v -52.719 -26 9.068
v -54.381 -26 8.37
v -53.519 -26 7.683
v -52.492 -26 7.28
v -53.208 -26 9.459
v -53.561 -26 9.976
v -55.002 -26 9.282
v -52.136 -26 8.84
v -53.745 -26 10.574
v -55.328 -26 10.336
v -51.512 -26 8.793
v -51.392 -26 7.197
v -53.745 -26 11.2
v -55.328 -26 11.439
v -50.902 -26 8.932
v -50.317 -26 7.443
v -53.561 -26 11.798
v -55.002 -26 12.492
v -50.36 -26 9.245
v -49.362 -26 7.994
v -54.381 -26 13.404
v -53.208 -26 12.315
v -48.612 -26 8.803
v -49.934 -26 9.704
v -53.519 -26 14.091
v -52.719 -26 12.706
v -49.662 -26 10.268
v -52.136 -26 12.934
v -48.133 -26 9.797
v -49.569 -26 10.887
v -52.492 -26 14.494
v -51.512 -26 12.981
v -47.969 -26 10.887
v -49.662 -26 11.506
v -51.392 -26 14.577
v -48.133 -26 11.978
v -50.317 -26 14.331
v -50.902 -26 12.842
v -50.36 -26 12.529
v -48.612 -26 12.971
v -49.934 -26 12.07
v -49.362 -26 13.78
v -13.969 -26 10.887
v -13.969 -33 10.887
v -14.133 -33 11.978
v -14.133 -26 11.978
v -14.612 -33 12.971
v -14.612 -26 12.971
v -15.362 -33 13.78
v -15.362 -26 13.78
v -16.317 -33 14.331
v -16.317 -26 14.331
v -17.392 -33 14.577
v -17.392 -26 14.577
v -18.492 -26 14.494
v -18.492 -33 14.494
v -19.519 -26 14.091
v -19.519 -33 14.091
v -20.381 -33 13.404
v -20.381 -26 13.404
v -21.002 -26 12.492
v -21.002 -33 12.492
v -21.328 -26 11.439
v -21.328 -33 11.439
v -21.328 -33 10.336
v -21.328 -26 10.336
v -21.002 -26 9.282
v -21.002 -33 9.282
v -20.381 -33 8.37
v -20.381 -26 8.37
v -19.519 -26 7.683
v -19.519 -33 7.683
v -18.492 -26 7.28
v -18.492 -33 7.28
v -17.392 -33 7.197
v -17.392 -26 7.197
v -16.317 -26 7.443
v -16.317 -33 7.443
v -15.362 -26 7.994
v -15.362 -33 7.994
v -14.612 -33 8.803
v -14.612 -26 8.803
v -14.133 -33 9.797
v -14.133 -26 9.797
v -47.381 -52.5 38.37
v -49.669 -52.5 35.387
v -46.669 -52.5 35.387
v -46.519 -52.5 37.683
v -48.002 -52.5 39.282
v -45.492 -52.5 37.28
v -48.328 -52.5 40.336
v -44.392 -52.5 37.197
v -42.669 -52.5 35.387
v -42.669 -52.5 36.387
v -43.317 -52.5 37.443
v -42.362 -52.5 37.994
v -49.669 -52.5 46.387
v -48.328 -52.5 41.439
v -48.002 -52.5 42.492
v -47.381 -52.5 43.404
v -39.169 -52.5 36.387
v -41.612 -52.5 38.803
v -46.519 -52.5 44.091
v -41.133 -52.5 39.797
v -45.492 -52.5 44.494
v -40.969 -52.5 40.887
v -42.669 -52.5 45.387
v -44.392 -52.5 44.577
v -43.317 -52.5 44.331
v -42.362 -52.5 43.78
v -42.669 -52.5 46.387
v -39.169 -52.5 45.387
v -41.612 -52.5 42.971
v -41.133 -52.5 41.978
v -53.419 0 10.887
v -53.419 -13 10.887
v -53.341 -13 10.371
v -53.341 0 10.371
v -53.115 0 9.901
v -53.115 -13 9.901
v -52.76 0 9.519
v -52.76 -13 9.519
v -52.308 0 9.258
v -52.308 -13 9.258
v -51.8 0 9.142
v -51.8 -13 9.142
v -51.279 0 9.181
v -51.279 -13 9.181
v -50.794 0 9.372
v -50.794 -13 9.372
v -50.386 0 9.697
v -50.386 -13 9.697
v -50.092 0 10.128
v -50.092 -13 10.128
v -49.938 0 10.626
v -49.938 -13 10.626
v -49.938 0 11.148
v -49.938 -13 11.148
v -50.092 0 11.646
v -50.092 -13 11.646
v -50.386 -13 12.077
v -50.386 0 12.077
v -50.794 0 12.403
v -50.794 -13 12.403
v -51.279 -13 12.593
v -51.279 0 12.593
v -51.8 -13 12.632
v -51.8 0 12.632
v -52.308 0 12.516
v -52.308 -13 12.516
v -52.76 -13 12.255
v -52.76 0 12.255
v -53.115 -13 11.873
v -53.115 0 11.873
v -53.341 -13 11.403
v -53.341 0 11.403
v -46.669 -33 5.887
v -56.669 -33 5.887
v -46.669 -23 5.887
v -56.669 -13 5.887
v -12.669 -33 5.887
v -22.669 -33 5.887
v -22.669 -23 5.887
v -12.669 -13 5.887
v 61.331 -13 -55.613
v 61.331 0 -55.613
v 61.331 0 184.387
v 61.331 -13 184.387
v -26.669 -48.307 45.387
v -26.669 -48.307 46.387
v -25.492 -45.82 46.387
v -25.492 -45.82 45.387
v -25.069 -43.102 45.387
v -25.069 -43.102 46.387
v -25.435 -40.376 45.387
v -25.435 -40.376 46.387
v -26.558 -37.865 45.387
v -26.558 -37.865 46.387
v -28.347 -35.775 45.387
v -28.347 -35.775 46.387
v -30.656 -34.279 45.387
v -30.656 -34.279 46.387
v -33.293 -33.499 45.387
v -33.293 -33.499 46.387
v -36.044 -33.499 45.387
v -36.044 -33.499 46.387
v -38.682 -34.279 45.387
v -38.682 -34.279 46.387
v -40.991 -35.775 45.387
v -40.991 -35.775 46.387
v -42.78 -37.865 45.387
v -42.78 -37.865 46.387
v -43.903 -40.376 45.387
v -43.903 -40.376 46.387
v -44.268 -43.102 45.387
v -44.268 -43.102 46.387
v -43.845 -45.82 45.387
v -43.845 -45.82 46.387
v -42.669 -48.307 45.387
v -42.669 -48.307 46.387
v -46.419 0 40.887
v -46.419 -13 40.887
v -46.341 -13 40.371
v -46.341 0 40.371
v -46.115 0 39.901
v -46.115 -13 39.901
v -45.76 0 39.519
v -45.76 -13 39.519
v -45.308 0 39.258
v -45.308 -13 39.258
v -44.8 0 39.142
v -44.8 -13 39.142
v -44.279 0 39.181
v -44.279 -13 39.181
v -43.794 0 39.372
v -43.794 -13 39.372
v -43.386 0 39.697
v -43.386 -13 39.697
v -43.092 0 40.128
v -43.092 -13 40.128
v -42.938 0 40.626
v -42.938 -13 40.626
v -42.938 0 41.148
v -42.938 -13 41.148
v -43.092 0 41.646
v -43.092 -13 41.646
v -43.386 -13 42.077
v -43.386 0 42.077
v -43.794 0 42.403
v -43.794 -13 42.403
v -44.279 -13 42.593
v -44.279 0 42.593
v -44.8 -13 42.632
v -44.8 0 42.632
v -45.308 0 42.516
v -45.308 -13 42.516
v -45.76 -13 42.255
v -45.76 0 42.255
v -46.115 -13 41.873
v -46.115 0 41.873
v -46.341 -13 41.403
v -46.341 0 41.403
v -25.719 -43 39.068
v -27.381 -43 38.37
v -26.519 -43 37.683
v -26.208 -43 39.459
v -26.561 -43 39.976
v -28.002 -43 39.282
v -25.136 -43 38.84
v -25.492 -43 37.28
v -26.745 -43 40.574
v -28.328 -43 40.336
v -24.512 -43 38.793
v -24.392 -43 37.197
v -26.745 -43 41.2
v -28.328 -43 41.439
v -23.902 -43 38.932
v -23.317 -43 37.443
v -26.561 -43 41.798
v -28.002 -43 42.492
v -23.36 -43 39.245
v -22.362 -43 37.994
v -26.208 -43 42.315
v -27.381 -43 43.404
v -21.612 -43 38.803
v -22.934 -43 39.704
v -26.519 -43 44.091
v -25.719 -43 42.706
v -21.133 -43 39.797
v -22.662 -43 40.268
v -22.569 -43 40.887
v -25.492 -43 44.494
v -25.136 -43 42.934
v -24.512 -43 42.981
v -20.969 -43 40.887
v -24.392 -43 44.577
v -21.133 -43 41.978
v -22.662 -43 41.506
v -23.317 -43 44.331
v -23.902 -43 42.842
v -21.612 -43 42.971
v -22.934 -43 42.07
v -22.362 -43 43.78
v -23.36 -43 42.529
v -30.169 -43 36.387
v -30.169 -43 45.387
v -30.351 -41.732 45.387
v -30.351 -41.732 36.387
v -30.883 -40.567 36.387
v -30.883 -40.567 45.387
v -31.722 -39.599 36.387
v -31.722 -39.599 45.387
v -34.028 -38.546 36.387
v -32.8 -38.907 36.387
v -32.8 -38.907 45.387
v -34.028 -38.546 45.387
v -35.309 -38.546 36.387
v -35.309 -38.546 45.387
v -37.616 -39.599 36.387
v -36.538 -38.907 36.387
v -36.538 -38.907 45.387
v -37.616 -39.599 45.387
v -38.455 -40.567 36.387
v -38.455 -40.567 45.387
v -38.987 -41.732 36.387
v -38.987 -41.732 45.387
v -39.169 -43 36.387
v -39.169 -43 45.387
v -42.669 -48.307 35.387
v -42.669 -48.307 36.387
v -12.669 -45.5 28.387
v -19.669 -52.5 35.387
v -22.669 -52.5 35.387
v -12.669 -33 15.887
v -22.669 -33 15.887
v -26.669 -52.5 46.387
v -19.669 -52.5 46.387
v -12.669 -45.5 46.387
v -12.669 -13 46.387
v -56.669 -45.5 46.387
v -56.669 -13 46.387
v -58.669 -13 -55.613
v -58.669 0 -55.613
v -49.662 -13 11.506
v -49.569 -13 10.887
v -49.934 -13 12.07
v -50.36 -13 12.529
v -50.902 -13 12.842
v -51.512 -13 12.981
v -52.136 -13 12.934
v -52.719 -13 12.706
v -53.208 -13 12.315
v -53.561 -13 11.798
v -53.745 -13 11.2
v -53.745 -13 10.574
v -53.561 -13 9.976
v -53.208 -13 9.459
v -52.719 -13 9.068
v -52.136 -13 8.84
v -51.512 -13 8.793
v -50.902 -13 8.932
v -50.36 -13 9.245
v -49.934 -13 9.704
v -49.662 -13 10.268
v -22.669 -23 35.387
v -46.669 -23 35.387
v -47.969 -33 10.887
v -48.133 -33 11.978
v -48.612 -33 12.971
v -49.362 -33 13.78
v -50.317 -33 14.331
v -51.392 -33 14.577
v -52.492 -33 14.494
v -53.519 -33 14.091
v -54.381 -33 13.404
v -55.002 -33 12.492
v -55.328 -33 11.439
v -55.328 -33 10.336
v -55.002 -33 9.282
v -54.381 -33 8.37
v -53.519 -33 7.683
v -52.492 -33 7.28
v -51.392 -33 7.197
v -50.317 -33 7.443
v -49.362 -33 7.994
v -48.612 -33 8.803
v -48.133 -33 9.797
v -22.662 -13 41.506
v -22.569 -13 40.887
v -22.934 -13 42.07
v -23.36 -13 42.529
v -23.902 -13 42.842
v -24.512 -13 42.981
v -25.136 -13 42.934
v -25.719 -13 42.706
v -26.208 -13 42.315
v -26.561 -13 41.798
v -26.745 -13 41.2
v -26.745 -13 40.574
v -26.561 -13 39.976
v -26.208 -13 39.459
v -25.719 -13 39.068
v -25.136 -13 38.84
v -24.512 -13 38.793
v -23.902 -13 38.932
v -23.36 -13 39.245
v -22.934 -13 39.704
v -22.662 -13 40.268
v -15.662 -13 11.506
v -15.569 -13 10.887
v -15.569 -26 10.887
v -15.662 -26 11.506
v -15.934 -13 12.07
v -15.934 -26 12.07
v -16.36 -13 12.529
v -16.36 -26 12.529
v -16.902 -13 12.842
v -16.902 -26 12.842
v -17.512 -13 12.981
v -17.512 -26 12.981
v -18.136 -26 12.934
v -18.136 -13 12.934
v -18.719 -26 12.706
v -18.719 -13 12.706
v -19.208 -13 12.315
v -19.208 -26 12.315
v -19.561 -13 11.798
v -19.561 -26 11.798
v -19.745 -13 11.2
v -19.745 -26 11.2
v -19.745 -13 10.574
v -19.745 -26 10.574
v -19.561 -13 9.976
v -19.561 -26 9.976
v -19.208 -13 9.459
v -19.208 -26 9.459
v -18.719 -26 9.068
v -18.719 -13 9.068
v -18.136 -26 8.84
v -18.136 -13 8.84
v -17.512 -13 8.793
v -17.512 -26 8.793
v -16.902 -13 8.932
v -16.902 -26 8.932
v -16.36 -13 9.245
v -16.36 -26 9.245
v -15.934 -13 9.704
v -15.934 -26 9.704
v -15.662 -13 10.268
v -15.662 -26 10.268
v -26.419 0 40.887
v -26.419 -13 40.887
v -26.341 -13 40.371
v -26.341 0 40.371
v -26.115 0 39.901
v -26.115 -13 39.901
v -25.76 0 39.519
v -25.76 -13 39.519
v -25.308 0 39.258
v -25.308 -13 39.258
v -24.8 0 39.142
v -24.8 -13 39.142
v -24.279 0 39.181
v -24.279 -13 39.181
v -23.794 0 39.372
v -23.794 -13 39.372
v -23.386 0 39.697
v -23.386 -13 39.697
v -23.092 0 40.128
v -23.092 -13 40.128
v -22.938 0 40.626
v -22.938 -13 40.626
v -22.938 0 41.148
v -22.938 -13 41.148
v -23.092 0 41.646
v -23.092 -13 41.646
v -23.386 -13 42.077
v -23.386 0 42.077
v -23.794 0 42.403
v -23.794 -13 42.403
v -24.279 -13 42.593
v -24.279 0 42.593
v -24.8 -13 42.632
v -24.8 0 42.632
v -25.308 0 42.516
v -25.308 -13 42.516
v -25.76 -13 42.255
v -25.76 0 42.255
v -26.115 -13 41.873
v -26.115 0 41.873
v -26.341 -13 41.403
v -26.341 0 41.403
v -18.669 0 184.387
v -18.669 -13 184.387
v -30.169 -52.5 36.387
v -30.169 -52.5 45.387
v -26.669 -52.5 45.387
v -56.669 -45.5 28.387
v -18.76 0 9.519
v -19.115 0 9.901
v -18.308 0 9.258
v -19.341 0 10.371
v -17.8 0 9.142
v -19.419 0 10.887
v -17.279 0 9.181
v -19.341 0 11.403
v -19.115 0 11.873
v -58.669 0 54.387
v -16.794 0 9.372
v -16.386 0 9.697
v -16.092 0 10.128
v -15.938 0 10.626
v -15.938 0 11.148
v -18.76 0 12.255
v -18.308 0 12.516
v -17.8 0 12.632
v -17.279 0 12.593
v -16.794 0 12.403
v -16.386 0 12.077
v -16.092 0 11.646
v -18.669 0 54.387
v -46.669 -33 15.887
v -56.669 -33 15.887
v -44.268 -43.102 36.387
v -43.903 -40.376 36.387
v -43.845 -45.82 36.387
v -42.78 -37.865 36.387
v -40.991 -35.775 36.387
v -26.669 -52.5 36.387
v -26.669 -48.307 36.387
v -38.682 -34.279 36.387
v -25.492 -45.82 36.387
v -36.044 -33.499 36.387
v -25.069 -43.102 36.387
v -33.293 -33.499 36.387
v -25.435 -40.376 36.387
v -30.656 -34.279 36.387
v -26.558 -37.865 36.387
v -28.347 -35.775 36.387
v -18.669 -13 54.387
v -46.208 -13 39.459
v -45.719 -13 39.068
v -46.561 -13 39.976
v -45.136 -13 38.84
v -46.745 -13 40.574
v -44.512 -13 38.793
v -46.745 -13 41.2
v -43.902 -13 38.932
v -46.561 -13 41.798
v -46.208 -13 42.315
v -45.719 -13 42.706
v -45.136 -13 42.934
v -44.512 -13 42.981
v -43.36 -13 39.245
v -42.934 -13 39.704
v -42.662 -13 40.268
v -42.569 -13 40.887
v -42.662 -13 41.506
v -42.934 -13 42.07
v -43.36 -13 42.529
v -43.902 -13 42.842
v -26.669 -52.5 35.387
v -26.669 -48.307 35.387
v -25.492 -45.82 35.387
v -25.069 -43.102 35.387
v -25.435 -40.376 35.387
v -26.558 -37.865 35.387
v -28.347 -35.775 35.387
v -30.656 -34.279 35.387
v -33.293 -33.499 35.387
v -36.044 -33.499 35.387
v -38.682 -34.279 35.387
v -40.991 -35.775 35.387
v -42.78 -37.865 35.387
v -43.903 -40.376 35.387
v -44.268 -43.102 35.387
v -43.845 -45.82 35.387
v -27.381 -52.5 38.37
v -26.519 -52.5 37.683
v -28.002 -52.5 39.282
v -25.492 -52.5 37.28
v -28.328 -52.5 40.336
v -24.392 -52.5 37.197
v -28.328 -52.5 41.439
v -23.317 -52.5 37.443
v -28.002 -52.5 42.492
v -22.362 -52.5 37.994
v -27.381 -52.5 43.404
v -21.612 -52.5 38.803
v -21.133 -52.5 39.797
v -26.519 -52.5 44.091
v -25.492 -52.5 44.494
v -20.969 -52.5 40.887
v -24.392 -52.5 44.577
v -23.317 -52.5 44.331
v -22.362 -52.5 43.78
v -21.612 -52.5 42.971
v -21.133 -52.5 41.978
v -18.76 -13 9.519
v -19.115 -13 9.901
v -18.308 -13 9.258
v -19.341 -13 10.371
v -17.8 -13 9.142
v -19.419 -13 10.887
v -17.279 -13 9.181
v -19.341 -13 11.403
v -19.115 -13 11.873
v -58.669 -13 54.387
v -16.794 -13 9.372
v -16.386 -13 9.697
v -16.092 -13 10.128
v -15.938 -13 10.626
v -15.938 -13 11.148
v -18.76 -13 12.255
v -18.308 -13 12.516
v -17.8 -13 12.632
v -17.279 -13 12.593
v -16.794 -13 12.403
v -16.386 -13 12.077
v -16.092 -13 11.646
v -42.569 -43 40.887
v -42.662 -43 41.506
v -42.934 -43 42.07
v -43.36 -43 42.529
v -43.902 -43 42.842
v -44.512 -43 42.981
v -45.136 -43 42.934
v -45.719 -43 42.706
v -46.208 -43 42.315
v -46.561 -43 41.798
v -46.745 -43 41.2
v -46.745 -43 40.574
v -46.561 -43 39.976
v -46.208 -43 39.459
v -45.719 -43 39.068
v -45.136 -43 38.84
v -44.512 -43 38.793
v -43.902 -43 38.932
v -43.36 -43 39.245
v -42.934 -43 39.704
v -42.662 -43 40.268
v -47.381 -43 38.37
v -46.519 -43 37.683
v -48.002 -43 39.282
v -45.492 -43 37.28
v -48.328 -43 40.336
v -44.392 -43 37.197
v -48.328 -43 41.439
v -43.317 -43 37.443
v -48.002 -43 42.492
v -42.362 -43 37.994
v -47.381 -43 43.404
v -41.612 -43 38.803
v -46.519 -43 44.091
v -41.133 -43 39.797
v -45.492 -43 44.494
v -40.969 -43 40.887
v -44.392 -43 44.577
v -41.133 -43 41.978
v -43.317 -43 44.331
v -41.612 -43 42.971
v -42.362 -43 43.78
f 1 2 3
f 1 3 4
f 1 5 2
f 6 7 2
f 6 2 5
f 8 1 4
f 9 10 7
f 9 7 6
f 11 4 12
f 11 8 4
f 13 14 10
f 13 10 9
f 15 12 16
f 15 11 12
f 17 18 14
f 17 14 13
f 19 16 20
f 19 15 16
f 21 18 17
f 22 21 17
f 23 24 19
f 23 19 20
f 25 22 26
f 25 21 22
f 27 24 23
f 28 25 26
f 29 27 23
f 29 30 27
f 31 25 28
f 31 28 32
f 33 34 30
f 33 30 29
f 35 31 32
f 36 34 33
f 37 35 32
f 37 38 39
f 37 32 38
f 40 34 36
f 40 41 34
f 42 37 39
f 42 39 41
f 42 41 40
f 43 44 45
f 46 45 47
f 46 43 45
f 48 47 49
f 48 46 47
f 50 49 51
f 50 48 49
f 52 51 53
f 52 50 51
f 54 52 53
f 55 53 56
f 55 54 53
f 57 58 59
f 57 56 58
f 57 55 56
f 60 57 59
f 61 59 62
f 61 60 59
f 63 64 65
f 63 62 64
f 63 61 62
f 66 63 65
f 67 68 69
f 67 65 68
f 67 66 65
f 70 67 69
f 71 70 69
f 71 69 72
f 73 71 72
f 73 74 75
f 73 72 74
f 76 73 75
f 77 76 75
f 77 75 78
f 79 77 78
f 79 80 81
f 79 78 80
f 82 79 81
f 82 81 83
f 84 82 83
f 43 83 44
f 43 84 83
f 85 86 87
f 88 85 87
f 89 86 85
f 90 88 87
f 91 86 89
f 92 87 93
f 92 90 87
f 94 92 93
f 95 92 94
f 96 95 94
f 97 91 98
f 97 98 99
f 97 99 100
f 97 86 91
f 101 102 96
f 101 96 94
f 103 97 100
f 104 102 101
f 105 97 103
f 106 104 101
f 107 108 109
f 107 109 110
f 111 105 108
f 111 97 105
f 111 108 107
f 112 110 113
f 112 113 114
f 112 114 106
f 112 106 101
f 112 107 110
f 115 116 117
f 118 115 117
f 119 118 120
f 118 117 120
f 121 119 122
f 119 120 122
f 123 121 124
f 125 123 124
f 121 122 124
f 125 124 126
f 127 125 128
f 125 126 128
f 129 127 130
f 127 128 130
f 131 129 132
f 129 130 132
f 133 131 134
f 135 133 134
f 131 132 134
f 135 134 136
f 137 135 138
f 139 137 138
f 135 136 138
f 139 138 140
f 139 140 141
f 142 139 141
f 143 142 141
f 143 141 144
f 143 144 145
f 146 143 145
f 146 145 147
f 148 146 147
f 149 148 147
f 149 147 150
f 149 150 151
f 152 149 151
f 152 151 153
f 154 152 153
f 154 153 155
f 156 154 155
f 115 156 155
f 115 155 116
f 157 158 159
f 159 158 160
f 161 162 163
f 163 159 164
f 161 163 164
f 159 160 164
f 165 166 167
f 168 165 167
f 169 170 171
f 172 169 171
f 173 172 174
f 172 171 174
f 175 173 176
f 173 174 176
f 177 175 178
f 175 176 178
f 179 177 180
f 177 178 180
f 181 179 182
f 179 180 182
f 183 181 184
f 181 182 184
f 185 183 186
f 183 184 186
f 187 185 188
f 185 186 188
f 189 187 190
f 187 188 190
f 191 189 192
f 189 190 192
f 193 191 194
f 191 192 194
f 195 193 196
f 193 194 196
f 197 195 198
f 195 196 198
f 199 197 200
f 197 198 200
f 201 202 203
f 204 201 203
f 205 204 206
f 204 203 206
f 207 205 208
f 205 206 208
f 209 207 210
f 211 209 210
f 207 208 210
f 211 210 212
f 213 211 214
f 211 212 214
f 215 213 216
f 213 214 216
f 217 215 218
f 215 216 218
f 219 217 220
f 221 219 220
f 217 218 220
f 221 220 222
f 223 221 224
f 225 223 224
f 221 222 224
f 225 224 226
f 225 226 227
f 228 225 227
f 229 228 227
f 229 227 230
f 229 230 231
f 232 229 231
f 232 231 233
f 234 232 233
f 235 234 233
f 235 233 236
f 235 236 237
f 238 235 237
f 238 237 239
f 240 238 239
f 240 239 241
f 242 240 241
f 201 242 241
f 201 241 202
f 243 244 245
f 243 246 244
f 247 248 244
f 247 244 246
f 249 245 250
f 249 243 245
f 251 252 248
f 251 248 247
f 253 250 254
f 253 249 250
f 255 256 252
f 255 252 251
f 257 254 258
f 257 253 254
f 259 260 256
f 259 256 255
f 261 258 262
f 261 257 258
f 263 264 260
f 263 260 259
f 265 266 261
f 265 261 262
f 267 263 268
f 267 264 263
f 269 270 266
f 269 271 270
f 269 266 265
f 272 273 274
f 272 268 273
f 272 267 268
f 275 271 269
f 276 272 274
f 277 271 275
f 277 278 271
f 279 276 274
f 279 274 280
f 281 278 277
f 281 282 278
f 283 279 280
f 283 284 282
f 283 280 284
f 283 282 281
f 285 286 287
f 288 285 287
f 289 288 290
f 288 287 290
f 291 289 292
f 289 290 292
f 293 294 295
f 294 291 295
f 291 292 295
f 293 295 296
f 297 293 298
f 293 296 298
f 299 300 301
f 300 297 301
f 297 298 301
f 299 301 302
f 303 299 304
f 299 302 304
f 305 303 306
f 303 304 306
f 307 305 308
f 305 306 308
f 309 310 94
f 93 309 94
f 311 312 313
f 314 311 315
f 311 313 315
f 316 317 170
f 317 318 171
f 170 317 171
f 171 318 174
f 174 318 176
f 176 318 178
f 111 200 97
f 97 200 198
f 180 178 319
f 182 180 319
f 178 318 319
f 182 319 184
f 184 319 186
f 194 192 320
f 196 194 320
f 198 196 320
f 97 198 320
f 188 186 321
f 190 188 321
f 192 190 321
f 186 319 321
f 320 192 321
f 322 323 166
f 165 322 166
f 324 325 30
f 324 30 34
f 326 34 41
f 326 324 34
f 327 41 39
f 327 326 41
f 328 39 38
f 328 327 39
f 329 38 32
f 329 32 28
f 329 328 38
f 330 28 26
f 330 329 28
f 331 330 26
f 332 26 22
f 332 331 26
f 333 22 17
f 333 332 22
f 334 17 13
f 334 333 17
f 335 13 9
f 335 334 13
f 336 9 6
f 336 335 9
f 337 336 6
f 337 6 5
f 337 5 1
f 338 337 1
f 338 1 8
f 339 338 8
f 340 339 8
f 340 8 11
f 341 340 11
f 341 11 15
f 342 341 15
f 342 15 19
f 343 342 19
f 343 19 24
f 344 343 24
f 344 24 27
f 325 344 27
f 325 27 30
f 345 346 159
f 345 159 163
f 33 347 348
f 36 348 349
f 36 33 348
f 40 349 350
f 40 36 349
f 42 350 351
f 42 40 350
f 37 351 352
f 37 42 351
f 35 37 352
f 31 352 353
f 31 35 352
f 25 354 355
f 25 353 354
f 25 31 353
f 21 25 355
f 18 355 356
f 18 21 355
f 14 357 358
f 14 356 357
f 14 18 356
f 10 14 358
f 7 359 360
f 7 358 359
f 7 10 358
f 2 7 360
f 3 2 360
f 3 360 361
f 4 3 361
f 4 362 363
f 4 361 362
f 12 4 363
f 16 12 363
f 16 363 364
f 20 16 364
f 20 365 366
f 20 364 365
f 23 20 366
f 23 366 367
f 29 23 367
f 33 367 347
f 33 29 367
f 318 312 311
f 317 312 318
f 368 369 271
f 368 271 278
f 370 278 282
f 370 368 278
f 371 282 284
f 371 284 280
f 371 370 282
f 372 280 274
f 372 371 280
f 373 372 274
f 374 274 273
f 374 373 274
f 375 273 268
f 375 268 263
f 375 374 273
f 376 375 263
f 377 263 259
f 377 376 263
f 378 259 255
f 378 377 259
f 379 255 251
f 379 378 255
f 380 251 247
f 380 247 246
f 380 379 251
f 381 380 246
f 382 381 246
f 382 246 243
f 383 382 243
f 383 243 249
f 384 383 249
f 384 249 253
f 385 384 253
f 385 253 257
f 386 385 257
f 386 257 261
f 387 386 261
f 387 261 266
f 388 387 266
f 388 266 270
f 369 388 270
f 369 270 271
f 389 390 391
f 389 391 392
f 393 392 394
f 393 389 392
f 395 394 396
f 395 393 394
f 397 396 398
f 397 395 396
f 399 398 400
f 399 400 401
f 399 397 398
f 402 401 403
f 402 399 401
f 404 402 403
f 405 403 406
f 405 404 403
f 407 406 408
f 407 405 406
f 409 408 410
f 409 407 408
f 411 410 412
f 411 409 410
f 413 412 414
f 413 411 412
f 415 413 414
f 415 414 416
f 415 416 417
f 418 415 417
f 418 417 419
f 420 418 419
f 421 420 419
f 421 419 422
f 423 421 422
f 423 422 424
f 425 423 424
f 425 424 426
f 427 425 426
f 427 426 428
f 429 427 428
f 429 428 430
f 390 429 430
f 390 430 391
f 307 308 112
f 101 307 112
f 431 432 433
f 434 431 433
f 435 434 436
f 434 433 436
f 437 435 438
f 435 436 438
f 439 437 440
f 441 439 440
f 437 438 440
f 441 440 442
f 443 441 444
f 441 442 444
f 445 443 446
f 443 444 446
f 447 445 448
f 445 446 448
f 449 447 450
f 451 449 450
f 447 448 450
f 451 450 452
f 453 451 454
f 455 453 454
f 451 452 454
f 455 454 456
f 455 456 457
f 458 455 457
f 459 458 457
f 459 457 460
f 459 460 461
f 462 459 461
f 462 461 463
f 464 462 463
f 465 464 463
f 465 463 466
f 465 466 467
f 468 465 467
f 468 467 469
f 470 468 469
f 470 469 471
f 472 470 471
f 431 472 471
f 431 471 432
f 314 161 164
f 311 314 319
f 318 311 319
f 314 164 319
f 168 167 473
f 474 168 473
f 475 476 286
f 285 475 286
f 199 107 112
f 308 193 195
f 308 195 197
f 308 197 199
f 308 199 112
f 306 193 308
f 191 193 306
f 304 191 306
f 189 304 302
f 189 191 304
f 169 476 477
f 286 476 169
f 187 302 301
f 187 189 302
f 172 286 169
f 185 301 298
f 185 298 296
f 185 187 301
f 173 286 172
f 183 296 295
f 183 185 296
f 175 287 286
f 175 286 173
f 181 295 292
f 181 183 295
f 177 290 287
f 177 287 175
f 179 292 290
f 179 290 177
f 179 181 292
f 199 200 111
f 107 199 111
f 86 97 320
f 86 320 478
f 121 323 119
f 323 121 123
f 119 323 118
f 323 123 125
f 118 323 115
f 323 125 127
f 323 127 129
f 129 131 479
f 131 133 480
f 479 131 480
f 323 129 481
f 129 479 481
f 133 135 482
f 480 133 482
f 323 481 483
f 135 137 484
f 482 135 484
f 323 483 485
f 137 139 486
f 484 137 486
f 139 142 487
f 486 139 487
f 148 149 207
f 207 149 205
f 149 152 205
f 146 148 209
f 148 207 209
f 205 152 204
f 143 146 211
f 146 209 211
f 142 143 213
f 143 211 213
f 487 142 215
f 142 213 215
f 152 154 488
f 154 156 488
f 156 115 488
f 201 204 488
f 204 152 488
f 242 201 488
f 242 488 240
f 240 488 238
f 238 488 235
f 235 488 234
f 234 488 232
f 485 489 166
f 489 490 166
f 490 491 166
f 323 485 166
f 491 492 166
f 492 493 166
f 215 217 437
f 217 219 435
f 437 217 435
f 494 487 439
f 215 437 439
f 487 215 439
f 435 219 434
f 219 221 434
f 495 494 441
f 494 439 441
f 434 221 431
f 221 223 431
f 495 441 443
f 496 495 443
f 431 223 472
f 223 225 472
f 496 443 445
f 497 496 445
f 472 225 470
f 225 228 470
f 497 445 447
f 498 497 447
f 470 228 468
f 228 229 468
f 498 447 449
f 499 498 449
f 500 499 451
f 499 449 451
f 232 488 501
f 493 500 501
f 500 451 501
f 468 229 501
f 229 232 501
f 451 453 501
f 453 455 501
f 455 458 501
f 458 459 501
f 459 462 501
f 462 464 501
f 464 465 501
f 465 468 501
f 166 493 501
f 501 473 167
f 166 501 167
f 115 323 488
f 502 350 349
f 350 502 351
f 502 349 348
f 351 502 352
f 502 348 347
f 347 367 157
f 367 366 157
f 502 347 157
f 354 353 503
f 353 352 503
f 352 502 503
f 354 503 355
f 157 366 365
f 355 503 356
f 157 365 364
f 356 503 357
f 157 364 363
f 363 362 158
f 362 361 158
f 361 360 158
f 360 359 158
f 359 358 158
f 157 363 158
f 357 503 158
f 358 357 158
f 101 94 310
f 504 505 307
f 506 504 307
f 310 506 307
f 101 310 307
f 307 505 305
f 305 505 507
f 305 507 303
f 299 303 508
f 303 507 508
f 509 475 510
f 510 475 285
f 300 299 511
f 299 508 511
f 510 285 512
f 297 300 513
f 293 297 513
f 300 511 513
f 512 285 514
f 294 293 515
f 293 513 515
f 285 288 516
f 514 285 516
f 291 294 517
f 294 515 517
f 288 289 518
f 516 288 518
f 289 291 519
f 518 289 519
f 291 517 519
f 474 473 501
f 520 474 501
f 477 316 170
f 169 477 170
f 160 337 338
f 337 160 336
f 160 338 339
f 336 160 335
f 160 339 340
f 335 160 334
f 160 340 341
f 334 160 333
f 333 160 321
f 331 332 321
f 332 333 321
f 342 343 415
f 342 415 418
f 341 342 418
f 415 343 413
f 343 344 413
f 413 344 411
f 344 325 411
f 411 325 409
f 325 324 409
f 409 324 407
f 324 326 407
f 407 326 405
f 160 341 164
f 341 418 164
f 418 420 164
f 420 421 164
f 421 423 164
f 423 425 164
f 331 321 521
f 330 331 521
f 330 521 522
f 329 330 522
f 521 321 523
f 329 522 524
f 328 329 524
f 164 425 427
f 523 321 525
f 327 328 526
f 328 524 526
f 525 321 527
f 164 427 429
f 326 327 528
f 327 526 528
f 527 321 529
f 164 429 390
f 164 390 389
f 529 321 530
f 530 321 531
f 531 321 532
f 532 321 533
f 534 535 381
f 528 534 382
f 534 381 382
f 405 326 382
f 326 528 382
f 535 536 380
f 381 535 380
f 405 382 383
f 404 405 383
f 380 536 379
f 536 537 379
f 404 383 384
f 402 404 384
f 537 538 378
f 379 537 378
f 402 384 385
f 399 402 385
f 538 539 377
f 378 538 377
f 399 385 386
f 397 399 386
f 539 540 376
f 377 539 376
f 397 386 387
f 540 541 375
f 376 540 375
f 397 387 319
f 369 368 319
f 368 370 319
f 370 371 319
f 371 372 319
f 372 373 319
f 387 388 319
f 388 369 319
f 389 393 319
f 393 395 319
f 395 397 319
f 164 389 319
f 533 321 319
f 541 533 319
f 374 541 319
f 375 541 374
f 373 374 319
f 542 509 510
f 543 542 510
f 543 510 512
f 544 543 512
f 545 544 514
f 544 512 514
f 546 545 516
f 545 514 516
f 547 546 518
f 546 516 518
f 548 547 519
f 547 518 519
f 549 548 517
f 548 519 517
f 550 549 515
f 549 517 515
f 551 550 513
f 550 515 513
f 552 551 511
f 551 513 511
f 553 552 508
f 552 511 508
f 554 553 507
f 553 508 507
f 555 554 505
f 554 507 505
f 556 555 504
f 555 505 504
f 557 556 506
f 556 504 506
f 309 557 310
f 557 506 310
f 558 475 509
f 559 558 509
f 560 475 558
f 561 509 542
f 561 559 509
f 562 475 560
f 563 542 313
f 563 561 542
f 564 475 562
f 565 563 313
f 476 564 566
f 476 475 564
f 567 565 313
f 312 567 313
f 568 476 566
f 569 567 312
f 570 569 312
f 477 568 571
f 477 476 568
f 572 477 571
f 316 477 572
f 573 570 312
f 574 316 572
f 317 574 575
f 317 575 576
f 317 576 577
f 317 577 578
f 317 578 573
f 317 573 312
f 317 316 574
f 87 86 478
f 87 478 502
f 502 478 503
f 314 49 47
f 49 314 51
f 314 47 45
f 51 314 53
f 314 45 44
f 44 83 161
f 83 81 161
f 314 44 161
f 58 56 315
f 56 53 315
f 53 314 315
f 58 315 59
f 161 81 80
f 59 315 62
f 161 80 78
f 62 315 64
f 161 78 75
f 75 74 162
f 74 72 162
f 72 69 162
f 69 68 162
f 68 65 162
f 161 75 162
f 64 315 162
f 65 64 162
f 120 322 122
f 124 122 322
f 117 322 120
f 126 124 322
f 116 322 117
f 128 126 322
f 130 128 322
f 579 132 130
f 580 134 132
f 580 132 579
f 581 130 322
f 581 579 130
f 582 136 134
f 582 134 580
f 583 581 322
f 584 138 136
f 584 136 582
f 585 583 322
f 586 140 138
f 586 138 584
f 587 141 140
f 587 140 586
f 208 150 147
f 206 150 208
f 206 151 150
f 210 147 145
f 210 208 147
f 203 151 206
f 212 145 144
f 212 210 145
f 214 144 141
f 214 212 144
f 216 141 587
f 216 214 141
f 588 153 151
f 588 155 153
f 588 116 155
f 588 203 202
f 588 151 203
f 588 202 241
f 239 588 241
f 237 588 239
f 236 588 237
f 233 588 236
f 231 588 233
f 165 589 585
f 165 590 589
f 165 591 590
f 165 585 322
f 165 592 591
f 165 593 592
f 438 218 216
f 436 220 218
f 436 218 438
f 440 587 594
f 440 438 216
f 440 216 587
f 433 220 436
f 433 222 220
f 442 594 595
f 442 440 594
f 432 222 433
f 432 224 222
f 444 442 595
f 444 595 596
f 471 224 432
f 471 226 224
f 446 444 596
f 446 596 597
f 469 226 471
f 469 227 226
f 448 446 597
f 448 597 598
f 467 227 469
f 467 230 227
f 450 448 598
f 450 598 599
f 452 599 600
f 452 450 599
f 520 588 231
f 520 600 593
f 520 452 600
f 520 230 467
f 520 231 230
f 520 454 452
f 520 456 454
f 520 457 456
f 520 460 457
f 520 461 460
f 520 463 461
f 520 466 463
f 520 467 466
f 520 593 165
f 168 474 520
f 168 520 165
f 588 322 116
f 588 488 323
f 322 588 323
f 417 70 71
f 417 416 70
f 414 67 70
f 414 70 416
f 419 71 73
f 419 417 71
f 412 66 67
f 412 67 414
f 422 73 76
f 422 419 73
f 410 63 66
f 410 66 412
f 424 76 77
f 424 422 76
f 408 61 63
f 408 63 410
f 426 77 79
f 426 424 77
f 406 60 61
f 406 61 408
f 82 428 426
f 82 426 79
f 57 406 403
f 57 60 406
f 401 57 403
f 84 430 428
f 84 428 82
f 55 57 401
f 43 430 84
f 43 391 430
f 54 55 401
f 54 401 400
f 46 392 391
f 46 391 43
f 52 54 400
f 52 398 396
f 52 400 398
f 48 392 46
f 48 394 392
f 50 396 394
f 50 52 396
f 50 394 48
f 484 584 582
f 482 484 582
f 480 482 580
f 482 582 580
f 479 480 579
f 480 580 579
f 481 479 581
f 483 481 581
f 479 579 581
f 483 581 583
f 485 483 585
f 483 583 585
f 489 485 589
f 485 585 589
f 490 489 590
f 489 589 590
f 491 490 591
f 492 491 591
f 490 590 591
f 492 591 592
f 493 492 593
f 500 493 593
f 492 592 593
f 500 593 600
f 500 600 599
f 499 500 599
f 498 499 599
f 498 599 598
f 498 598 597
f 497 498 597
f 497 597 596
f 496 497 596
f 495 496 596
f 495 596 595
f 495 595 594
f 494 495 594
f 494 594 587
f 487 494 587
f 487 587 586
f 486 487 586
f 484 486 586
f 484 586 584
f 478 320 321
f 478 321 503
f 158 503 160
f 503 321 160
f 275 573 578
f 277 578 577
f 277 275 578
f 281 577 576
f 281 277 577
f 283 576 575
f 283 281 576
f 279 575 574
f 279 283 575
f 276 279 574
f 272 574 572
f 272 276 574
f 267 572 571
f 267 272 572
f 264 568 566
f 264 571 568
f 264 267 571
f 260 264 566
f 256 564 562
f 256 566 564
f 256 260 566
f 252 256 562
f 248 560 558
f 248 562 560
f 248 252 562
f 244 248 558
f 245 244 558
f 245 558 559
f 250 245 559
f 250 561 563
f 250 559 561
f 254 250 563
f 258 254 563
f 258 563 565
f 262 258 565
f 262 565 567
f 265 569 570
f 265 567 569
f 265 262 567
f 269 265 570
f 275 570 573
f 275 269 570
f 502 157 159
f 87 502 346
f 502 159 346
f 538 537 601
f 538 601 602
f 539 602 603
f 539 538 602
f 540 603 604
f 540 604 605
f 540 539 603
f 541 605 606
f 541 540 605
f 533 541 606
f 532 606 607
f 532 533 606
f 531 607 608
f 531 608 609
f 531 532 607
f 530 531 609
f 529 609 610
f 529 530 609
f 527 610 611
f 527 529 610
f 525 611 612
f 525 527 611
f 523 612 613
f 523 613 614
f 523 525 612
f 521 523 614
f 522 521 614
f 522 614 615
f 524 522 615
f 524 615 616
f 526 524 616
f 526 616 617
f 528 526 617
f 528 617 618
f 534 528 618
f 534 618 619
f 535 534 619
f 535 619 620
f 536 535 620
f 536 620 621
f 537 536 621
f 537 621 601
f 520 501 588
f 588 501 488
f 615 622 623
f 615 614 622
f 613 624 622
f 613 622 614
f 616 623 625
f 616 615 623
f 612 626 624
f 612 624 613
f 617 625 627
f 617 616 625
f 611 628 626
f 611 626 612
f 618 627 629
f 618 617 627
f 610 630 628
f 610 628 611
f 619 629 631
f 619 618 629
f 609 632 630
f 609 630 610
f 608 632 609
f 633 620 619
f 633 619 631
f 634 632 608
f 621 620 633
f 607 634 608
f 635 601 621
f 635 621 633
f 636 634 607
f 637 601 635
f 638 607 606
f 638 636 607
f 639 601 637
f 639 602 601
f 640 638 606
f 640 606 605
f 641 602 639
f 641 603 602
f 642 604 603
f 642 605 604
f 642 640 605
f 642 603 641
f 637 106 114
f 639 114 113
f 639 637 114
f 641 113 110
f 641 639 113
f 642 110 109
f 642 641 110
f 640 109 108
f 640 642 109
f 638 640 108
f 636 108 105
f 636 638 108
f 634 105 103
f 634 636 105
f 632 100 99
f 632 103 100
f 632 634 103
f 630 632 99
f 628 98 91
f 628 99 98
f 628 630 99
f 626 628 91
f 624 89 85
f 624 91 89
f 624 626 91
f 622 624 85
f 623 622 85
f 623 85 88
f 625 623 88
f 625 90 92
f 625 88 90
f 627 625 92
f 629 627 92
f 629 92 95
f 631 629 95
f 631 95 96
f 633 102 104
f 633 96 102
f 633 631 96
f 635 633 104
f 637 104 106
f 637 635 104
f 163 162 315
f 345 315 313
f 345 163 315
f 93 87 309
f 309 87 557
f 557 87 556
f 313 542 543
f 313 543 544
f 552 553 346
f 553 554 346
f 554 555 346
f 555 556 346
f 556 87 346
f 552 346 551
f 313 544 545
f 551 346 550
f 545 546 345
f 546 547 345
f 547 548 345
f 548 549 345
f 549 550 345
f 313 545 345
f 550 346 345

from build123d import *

# Parameters (mm, degrees)
F1_DEPTH  = 13
F2_D      = 3.5
F3_R      = 3.7
F3_W      = 24
F3_H      = 29.5
F3_R_2    = 2.1
F3_R_3    = 1.75
F4_DEPTH  = 39.5
F5_DEPTH  = 39.501
F6_START  = 30
F6_DEPTH  = 9.501
F7_START  = 13
F7_DEPTH  = 26.501
F9_DEPTH  = 10
F11_DEPTH = 118.001
F12_DEPTH = 102.001
F13_DEPTH = 1
F14_START = -10
F14_DEPTH = 92.001
F15_SIZE  = 7


with BuildPart() as f1:
    # F0 (on Front) → F1 (new body)
    with BuildSketch(Plane.XZ):
        Polygon((-18.6688979508, 54.3871098008), (-58.6688979508, 54.3871098008), (-58.6688979508, -55.6128901992), (61.3311020492, -55.6128901992), (61.3311020492, 184.3871098008), (-18.6688979508, 184.3871098008), align=None)
    extrude(amount=F1_DEPTH)

    # F2 (through all)
    with Locations(Plane(origin=(0, 0, 0), x_dir=(1, 0, 0), z_dir=(0, 1, 0))):
        with Locations((-44.6688979508, -40.8871098008), (-24.6688979508, -40.8871098008), (-51.6688979508, -10.8871098008), (-17.6688979508, -10.8871098008)):
            Hole(F2_D / 2)


with BuildPart() as f4:
    # F3 (on face) → F4 (new body)
    with BuildSketch(Plane.XZ.offset(13)):
        Polygon((-22.6688979508, 5.8871098008), (-12.6688979508, 5.8871098008), (-12.6688979508, 46.3871098008), (-56.6688979508, 46.3871098008), (-56.6688979508, 5.8871098008), (-46.6688979508, 5.8871098008), (-46.6688979508, 35.3871098008), (-22.6688979508, 35.3871098008), align=None)
        with Locations((-51.6688979508, 10.8871098008)):
            Circle(F3_R, mode=Mode.SUBTRACT)
        with Locations((-44.6688979508, 40.8871098008)):
            Circle(F3_R, mode=Mode.SUBTRACT)
        with Locations((-17.6688979508, 10.8871098008)):
            Circle(F3_R, mode=Mode.SUBTRACT)
        with Locations((-24.6688979508, 40.8871098008)):
            Circle(F3_R, mode=Mode.SUBTRACT)
        with Locations((-34.6688979508, 20.6371098008)):
            Rectangle(F3_W, F3_H)
        with Locations((-44.6688979508, 40.8871098008)):
            Circle(F3_R)
        with Locations((-44.6688979508, 40.8871098008)):
            Circle(F3_R_2, mode=Mode.SUBTRACT)
        with Locations((-24.6688979508, 40.8871098008)):
            Circle(F3_R)
        with Locations((-24.6688979508, 40.8871098008)):
            Circle(F3_R_2, mode=Mode.SUBTRACT)
        with Locations((-51.6688979508, 10.8871098008)):
            Circle(F3_R)
        with Locations((-51.6688979508, 10.8871098008)):
            Circle(F3_R_2, mode=Mode.SUBTRACT)
        with Locations((-17.6688979508, 10.8871098008)):
            Circle(F3_R)
        with Locations((-17.6688979508, 10.8871098008)):
            Circle(F3_R_2, mode=Mode.SUBTRACT)
        with Locations((-17.6688979508, 10.8871098008)):
            Circle(F3_R_2)
        with Locations((-17.6688979508, 10.8871098008)):
            Circle(F3_R_3, mode=Mode.SUBTRACT)
        with Locations((-51.6688979508, 10.8871098008)):
            Circle(F3_R_2)
        with Locations((-51.6688979508, 10.8871098008)):
            Circle(F3_R_3, mode=Mode.SUBTRACT)
        with Locations((-44.6688979508, 40.8871098008)):
            Circle(F3_R_2)
        with Locations((-44.6688979508, 40.8871098008)):
            Circle(F3_R_3, mode=Mode.SUBTRACT)
        with Locations((-24.6688979508, 40.8871098008)):
            Circle(F3_R_2)
        with Locations((-24.6688979508, 40.8871098008)):
            Circle(F3_R_3, mode=Mode.SUBTRACT)
    extrude(amount=F4_DEPTH)

    # F3 (on face) → F5 (cut, through all)
    with BuildSketch(Plane.XZ.offset(13)):
        with Locations((-34.6688979508, 20.6371098008)):
            Rectangle(F3_W, F3_H)
        with Locations((-17.6688979508, 10.8871098008)):
            Circle(F3_R_2)
        with Locations((-17.6688979508, 10.8871098008)):
            Circle(F3_R_3, mode=Mode.SUBTRACT)
        with Locations((-51.6688979508, 10.8871098008)):
            Circle(F3_R_2)
        with Locations((-51.6688979508, 10.8871098008)):
            Circle(F3_R_3, mode=Mode.SUBTRACT)
        with Locations((-44.6688979508, 40.8871098008)):
            Circle(F3_R_2)
        with Locations((-44.6688979508, 40.8871098008)):
            Circle(F3_R_3, mode=Mode.SUBTRACT)
        with Locations((-24.6688979508, 40.8871098008)):
            Circle(F3_R_2)
        with Locations((-24.6688979508, 40.8871098008)):
            Circle(F3_R_3, mode=Mode.SUBTRACT)
    extrude(amount=F5_DEPTH, mode=Mode.SUBTRACT)

    # F3 (on face) → F6 (cut)
    with BuildSketch(Plane.XZ.offset(13).offset(F6_START)):
        with Locations((-44.6688979508, 40.8871098008)):
            Circle(F3_R)
        with Locations((-44.6688979508, 40.8871098008)):
            Circle(F3_R_2, mode=Mode.SUBTRACT)
        with Locations((-24.6688979508, 40.8871098008)):
            Circle(F3_R)
        with Locations((-24.6688979508, 40.8871098008)):
            Circle(F3_R_2, mode=Mode.SUBTRACT)
    extrude(amount=F6_DEPTH, mode=Mode.SUBTRACT)

    # F3 (on face) → F7 (cut)
    with BuildSketch(Plane.XZ.offset(13).offset(F7_START)):
        with Locations((-17.6688979508, 10.8871098008)):
            Circle(F3_R)
        with Locations((-17.6688979508, 10.8871098008)):
            Circle(F3_R_2, mode=Mode.SUBTRACT)
        with Locations((-51.6688979508, 10.8871098008)):
            Circle(F3_R)
        with Locations((-51.6688979508, 10.8871098008)):
            Circle(F3_R_2, mode=Mode.SUBTRACT)
    extrude(amount=F7_DEPTH, mode=Mode.SUBTRACT)

    # F3 (on face) → F9 (join)
    with BuildSketch(Plane.XZ.offset(13)):
        with Locations((-34.6688979508, 20.6371098008)):
            Rectangle(F3_W, F3_H)
        with Locations((-51.6688979508, 10.8871098008)):
            Circle(F3_R)
        with Locations((-51.6688979508, 10.8871098008)):
            Circle(F3_R_2, mode=Mode.SUBTRACT)
        with Locations((-17.6688979508, 10.8871098008)):
            Circle(F3_R)
        with Locations((-17.6688979508, 10.8871098008)):
            Circle(F3_R_2, mode=Mode.SUBTRACT)
    extrude(amount=F9_DEPTH)

    # F10 (on face) → F11 (cut, through all)
    with BuildSketch(Plane(origin=(-56.6688979508, 0, 0), x_dir=(0, -1, 0), z_dir=(-1, 0, 0))):
        Polygon((52.5, 5.8871098008), (52.5, 35.3871098008), (33, 15.8871098008), (33, 5.8871098008), align=None)
    extrude(amount=-F11_DEPTH, mode=Mode.SUBTRACT)

    # F8 (on face) → F12 (cut, through all)
    with BuildSketch(Plane.XY.offset(46.3871098008)):
        with BuildLine():
            Line((-39.1688979508, -52.5), (-30.1688979508, -52.5))
            Line((-30.1688979508, -52.5), (-30.1688979508, -43))
            ThreePointArc((-30.1688979508, -43), (-34.6688979508, -38.5), (-39.1688979508, -43))
            Line((-39.1688979508, -43), (-39.1688979508, -52.5))
        make_face()
    extrude(amount=-F12_DEPTH, mode=Mode.SUBTRACT)

    # F8 (on face) → F13 (cut)
    with BuildSketch(Plane.XY.offset(46.3871098008)):
        with BuildLine():
            Line((-26.6688979508, -52.5), (-26.6688979508, -48.3065996646))
            ThreePointArc((-26.6688979508, -48.3065996646), (-34.6688979508, -33.4), (-42.6688979508, -48.3065996646))
            Line((-42.6688979508, -48.3065996646), (-42.6688979508, -52.5))
            Line((-42.6688979508, -52.5), (-39.1688979508, -52.5))
            Line((-39.1688979508, -52.5), (-39.1688979508, -43))
            ThreePointArc((-39.1688979508, -43), (-34.6688979508, -38.5), (-30.1688979508, -43))
            Line((-30.1688979508, -43), (-30.1688979508, -52.5))
            Line((-30.1688979508, -52.5), (-26.6688979508, -52.5))
        make_face()
    extrude(amount=-F13_DEPTH, mode=Mode.SUBTRACT)

    # F8 (on face) → F14 (cut)
    with BuildSketch(Plane.XY.offset(46.3871098008).offset(F14_START)):
        with BuildLine():
            Line((-26.6688979508, -52.5), (-26.6688979508, -48.3065996646))
            ThreePointArc((-26.6688979508, -48.3065996646), (-34.6688979508, -33.4), (-42.6688979508, -48.3065996646))
            Line((-42.6688979508, -48.3065996646), (-42.6688979508, -52.5))
            Line((-42.6688979508, -52.5), (-39.1688979508, -52.5))
            Line((-39.1688979508, -52.5), (-39.1688979508, -43))
            ThreePointArc((-39.1688979508, -43), (-34.6688979508, -38.5), (-30.1688979508, -43))
            Line((-30.1688979508, -43), (-30.1688979508, -52.5))
            Line((-30.1688979508, -52.5), (-26.6688979508, -52.5))
        make_face()
    extrude(amount=-F14_DEPTH, mode=Mode.SUBTRACT)

    # F15
    f15_edges = [f4.edges().sort_by_distance(p)[0] for p in [
        (-56.668898, -52.5, 40.88711),
        (-12.668898, -52.5, 40.88711),
    ]]
    chamfer(f15_edges, length=F15_SIZE)


solid = Compound([f1.part, f4.part])
